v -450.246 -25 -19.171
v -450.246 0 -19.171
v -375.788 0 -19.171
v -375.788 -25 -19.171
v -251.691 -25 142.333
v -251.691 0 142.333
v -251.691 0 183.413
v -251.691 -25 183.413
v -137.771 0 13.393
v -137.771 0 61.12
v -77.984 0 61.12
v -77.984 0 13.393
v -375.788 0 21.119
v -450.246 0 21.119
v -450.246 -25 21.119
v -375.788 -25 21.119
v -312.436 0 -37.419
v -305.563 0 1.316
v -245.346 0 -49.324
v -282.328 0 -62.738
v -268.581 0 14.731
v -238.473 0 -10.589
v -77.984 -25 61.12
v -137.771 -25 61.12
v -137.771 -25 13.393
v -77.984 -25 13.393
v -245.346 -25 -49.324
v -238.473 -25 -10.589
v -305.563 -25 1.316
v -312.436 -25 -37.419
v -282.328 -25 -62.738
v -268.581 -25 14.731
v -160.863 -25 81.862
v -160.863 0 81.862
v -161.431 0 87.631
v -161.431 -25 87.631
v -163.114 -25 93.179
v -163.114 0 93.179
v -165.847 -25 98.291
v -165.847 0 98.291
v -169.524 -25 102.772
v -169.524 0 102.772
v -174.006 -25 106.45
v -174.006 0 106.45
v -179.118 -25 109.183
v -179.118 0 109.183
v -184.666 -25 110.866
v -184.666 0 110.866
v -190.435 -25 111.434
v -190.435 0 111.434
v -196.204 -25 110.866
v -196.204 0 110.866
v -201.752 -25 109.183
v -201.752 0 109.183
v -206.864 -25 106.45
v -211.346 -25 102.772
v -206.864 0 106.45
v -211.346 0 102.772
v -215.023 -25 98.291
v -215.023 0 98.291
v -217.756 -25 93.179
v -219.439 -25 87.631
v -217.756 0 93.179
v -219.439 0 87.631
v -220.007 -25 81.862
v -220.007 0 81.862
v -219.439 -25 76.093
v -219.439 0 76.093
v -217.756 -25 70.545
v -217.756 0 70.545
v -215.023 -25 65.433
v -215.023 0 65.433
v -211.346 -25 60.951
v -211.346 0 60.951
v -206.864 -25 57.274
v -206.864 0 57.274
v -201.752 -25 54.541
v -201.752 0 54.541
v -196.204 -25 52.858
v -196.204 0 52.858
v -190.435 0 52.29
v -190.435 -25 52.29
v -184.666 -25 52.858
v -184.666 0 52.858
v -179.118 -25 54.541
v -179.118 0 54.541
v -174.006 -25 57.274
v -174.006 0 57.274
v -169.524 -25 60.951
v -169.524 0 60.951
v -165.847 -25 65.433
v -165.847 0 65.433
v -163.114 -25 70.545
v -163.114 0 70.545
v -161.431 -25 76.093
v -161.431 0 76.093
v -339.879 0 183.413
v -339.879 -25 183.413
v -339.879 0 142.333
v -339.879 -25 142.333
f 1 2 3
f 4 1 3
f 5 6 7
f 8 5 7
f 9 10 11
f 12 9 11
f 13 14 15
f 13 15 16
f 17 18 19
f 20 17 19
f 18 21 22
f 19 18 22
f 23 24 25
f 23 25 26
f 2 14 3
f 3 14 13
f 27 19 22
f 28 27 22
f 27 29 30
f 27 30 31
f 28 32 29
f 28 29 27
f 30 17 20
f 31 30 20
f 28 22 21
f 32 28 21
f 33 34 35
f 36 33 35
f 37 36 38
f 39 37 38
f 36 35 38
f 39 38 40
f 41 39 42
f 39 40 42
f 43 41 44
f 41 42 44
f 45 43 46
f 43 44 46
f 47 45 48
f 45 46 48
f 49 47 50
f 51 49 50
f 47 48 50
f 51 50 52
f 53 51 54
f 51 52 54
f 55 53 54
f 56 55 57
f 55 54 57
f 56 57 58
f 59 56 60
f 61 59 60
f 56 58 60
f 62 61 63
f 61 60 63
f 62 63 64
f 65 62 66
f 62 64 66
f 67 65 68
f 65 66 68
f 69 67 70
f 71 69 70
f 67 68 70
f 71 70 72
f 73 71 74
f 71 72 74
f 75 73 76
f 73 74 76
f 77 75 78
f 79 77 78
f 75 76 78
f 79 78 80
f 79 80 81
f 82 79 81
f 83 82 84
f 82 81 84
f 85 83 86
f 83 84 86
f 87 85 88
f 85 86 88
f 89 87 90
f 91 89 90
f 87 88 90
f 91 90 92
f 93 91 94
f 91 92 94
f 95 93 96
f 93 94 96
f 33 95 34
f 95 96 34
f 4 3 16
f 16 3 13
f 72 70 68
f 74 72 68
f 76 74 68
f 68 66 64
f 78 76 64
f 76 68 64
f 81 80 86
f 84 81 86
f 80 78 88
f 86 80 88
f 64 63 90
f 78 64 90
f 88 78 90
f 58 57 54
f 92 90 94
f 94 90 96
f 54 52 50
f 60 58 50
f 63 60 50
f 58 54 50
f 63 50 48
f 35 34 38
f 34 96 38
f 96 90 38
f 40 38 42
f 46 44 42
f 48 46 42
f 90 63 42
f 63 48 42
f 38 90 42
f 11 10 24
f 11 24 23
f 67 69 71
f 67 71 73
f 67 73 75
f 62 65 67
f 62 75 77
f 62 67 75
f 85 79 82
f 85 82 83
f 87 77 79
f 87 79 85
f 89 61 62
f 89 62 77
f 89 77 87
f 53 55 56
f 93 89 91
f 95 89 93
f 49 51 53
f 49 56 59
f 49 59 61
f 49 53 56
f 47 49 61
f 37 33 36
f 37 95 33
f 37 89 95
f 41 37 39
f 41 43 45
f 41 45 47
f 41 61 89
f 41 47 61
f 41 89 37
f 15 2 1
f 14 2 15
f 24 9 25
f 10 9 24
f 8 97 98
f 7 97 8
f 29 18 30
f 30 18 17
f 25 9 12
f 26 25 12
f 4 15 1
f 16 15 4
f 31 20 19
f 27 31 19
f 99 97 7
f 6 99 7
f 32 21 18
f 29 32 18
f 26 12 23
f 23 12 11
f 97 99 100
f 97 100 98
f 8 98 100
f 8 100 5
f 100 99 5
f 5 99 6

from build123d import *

# Parameters (mm, degrees)
F0_W     = 59.787556
F0_H     = 47.727292
F0_W_2   = 74.457943
F0_H_2   = 40.290097
F0_W_3   = 88.187784
F0_H_3   = 41.079268
F0_R     = 29.57195
F1_DEPTH = 25


with BuildPart() as f1:
    # F0 (on Front) → F1 (new body)
    with BuildSketch(Plane.XZ):
        with Locations((-107.877545, 37.2567)):
            Rectangle(F0_W, F0_H)
        with Locations((-413.016736, 0.973942)):
            Rectangle(F0_W_2, F0_H_2)
        with Locations((-295.785084, 162.872903)):
            Rectangle(F0_W_3, F0_H_3)
        with Locations((-190.435007, 81.861973)):
            Circle(F0_R)
        Polygon((-268.581096, 14.730557), (-305.562731, 1.315775), (-312.436007, -37.41865), (-282.327648, -62.738295), (-245.346014, -49.323513), (-238.472738, -10.589088), align=None)
    extrude(amount=F1_DEPTH)


solid = f1.part
